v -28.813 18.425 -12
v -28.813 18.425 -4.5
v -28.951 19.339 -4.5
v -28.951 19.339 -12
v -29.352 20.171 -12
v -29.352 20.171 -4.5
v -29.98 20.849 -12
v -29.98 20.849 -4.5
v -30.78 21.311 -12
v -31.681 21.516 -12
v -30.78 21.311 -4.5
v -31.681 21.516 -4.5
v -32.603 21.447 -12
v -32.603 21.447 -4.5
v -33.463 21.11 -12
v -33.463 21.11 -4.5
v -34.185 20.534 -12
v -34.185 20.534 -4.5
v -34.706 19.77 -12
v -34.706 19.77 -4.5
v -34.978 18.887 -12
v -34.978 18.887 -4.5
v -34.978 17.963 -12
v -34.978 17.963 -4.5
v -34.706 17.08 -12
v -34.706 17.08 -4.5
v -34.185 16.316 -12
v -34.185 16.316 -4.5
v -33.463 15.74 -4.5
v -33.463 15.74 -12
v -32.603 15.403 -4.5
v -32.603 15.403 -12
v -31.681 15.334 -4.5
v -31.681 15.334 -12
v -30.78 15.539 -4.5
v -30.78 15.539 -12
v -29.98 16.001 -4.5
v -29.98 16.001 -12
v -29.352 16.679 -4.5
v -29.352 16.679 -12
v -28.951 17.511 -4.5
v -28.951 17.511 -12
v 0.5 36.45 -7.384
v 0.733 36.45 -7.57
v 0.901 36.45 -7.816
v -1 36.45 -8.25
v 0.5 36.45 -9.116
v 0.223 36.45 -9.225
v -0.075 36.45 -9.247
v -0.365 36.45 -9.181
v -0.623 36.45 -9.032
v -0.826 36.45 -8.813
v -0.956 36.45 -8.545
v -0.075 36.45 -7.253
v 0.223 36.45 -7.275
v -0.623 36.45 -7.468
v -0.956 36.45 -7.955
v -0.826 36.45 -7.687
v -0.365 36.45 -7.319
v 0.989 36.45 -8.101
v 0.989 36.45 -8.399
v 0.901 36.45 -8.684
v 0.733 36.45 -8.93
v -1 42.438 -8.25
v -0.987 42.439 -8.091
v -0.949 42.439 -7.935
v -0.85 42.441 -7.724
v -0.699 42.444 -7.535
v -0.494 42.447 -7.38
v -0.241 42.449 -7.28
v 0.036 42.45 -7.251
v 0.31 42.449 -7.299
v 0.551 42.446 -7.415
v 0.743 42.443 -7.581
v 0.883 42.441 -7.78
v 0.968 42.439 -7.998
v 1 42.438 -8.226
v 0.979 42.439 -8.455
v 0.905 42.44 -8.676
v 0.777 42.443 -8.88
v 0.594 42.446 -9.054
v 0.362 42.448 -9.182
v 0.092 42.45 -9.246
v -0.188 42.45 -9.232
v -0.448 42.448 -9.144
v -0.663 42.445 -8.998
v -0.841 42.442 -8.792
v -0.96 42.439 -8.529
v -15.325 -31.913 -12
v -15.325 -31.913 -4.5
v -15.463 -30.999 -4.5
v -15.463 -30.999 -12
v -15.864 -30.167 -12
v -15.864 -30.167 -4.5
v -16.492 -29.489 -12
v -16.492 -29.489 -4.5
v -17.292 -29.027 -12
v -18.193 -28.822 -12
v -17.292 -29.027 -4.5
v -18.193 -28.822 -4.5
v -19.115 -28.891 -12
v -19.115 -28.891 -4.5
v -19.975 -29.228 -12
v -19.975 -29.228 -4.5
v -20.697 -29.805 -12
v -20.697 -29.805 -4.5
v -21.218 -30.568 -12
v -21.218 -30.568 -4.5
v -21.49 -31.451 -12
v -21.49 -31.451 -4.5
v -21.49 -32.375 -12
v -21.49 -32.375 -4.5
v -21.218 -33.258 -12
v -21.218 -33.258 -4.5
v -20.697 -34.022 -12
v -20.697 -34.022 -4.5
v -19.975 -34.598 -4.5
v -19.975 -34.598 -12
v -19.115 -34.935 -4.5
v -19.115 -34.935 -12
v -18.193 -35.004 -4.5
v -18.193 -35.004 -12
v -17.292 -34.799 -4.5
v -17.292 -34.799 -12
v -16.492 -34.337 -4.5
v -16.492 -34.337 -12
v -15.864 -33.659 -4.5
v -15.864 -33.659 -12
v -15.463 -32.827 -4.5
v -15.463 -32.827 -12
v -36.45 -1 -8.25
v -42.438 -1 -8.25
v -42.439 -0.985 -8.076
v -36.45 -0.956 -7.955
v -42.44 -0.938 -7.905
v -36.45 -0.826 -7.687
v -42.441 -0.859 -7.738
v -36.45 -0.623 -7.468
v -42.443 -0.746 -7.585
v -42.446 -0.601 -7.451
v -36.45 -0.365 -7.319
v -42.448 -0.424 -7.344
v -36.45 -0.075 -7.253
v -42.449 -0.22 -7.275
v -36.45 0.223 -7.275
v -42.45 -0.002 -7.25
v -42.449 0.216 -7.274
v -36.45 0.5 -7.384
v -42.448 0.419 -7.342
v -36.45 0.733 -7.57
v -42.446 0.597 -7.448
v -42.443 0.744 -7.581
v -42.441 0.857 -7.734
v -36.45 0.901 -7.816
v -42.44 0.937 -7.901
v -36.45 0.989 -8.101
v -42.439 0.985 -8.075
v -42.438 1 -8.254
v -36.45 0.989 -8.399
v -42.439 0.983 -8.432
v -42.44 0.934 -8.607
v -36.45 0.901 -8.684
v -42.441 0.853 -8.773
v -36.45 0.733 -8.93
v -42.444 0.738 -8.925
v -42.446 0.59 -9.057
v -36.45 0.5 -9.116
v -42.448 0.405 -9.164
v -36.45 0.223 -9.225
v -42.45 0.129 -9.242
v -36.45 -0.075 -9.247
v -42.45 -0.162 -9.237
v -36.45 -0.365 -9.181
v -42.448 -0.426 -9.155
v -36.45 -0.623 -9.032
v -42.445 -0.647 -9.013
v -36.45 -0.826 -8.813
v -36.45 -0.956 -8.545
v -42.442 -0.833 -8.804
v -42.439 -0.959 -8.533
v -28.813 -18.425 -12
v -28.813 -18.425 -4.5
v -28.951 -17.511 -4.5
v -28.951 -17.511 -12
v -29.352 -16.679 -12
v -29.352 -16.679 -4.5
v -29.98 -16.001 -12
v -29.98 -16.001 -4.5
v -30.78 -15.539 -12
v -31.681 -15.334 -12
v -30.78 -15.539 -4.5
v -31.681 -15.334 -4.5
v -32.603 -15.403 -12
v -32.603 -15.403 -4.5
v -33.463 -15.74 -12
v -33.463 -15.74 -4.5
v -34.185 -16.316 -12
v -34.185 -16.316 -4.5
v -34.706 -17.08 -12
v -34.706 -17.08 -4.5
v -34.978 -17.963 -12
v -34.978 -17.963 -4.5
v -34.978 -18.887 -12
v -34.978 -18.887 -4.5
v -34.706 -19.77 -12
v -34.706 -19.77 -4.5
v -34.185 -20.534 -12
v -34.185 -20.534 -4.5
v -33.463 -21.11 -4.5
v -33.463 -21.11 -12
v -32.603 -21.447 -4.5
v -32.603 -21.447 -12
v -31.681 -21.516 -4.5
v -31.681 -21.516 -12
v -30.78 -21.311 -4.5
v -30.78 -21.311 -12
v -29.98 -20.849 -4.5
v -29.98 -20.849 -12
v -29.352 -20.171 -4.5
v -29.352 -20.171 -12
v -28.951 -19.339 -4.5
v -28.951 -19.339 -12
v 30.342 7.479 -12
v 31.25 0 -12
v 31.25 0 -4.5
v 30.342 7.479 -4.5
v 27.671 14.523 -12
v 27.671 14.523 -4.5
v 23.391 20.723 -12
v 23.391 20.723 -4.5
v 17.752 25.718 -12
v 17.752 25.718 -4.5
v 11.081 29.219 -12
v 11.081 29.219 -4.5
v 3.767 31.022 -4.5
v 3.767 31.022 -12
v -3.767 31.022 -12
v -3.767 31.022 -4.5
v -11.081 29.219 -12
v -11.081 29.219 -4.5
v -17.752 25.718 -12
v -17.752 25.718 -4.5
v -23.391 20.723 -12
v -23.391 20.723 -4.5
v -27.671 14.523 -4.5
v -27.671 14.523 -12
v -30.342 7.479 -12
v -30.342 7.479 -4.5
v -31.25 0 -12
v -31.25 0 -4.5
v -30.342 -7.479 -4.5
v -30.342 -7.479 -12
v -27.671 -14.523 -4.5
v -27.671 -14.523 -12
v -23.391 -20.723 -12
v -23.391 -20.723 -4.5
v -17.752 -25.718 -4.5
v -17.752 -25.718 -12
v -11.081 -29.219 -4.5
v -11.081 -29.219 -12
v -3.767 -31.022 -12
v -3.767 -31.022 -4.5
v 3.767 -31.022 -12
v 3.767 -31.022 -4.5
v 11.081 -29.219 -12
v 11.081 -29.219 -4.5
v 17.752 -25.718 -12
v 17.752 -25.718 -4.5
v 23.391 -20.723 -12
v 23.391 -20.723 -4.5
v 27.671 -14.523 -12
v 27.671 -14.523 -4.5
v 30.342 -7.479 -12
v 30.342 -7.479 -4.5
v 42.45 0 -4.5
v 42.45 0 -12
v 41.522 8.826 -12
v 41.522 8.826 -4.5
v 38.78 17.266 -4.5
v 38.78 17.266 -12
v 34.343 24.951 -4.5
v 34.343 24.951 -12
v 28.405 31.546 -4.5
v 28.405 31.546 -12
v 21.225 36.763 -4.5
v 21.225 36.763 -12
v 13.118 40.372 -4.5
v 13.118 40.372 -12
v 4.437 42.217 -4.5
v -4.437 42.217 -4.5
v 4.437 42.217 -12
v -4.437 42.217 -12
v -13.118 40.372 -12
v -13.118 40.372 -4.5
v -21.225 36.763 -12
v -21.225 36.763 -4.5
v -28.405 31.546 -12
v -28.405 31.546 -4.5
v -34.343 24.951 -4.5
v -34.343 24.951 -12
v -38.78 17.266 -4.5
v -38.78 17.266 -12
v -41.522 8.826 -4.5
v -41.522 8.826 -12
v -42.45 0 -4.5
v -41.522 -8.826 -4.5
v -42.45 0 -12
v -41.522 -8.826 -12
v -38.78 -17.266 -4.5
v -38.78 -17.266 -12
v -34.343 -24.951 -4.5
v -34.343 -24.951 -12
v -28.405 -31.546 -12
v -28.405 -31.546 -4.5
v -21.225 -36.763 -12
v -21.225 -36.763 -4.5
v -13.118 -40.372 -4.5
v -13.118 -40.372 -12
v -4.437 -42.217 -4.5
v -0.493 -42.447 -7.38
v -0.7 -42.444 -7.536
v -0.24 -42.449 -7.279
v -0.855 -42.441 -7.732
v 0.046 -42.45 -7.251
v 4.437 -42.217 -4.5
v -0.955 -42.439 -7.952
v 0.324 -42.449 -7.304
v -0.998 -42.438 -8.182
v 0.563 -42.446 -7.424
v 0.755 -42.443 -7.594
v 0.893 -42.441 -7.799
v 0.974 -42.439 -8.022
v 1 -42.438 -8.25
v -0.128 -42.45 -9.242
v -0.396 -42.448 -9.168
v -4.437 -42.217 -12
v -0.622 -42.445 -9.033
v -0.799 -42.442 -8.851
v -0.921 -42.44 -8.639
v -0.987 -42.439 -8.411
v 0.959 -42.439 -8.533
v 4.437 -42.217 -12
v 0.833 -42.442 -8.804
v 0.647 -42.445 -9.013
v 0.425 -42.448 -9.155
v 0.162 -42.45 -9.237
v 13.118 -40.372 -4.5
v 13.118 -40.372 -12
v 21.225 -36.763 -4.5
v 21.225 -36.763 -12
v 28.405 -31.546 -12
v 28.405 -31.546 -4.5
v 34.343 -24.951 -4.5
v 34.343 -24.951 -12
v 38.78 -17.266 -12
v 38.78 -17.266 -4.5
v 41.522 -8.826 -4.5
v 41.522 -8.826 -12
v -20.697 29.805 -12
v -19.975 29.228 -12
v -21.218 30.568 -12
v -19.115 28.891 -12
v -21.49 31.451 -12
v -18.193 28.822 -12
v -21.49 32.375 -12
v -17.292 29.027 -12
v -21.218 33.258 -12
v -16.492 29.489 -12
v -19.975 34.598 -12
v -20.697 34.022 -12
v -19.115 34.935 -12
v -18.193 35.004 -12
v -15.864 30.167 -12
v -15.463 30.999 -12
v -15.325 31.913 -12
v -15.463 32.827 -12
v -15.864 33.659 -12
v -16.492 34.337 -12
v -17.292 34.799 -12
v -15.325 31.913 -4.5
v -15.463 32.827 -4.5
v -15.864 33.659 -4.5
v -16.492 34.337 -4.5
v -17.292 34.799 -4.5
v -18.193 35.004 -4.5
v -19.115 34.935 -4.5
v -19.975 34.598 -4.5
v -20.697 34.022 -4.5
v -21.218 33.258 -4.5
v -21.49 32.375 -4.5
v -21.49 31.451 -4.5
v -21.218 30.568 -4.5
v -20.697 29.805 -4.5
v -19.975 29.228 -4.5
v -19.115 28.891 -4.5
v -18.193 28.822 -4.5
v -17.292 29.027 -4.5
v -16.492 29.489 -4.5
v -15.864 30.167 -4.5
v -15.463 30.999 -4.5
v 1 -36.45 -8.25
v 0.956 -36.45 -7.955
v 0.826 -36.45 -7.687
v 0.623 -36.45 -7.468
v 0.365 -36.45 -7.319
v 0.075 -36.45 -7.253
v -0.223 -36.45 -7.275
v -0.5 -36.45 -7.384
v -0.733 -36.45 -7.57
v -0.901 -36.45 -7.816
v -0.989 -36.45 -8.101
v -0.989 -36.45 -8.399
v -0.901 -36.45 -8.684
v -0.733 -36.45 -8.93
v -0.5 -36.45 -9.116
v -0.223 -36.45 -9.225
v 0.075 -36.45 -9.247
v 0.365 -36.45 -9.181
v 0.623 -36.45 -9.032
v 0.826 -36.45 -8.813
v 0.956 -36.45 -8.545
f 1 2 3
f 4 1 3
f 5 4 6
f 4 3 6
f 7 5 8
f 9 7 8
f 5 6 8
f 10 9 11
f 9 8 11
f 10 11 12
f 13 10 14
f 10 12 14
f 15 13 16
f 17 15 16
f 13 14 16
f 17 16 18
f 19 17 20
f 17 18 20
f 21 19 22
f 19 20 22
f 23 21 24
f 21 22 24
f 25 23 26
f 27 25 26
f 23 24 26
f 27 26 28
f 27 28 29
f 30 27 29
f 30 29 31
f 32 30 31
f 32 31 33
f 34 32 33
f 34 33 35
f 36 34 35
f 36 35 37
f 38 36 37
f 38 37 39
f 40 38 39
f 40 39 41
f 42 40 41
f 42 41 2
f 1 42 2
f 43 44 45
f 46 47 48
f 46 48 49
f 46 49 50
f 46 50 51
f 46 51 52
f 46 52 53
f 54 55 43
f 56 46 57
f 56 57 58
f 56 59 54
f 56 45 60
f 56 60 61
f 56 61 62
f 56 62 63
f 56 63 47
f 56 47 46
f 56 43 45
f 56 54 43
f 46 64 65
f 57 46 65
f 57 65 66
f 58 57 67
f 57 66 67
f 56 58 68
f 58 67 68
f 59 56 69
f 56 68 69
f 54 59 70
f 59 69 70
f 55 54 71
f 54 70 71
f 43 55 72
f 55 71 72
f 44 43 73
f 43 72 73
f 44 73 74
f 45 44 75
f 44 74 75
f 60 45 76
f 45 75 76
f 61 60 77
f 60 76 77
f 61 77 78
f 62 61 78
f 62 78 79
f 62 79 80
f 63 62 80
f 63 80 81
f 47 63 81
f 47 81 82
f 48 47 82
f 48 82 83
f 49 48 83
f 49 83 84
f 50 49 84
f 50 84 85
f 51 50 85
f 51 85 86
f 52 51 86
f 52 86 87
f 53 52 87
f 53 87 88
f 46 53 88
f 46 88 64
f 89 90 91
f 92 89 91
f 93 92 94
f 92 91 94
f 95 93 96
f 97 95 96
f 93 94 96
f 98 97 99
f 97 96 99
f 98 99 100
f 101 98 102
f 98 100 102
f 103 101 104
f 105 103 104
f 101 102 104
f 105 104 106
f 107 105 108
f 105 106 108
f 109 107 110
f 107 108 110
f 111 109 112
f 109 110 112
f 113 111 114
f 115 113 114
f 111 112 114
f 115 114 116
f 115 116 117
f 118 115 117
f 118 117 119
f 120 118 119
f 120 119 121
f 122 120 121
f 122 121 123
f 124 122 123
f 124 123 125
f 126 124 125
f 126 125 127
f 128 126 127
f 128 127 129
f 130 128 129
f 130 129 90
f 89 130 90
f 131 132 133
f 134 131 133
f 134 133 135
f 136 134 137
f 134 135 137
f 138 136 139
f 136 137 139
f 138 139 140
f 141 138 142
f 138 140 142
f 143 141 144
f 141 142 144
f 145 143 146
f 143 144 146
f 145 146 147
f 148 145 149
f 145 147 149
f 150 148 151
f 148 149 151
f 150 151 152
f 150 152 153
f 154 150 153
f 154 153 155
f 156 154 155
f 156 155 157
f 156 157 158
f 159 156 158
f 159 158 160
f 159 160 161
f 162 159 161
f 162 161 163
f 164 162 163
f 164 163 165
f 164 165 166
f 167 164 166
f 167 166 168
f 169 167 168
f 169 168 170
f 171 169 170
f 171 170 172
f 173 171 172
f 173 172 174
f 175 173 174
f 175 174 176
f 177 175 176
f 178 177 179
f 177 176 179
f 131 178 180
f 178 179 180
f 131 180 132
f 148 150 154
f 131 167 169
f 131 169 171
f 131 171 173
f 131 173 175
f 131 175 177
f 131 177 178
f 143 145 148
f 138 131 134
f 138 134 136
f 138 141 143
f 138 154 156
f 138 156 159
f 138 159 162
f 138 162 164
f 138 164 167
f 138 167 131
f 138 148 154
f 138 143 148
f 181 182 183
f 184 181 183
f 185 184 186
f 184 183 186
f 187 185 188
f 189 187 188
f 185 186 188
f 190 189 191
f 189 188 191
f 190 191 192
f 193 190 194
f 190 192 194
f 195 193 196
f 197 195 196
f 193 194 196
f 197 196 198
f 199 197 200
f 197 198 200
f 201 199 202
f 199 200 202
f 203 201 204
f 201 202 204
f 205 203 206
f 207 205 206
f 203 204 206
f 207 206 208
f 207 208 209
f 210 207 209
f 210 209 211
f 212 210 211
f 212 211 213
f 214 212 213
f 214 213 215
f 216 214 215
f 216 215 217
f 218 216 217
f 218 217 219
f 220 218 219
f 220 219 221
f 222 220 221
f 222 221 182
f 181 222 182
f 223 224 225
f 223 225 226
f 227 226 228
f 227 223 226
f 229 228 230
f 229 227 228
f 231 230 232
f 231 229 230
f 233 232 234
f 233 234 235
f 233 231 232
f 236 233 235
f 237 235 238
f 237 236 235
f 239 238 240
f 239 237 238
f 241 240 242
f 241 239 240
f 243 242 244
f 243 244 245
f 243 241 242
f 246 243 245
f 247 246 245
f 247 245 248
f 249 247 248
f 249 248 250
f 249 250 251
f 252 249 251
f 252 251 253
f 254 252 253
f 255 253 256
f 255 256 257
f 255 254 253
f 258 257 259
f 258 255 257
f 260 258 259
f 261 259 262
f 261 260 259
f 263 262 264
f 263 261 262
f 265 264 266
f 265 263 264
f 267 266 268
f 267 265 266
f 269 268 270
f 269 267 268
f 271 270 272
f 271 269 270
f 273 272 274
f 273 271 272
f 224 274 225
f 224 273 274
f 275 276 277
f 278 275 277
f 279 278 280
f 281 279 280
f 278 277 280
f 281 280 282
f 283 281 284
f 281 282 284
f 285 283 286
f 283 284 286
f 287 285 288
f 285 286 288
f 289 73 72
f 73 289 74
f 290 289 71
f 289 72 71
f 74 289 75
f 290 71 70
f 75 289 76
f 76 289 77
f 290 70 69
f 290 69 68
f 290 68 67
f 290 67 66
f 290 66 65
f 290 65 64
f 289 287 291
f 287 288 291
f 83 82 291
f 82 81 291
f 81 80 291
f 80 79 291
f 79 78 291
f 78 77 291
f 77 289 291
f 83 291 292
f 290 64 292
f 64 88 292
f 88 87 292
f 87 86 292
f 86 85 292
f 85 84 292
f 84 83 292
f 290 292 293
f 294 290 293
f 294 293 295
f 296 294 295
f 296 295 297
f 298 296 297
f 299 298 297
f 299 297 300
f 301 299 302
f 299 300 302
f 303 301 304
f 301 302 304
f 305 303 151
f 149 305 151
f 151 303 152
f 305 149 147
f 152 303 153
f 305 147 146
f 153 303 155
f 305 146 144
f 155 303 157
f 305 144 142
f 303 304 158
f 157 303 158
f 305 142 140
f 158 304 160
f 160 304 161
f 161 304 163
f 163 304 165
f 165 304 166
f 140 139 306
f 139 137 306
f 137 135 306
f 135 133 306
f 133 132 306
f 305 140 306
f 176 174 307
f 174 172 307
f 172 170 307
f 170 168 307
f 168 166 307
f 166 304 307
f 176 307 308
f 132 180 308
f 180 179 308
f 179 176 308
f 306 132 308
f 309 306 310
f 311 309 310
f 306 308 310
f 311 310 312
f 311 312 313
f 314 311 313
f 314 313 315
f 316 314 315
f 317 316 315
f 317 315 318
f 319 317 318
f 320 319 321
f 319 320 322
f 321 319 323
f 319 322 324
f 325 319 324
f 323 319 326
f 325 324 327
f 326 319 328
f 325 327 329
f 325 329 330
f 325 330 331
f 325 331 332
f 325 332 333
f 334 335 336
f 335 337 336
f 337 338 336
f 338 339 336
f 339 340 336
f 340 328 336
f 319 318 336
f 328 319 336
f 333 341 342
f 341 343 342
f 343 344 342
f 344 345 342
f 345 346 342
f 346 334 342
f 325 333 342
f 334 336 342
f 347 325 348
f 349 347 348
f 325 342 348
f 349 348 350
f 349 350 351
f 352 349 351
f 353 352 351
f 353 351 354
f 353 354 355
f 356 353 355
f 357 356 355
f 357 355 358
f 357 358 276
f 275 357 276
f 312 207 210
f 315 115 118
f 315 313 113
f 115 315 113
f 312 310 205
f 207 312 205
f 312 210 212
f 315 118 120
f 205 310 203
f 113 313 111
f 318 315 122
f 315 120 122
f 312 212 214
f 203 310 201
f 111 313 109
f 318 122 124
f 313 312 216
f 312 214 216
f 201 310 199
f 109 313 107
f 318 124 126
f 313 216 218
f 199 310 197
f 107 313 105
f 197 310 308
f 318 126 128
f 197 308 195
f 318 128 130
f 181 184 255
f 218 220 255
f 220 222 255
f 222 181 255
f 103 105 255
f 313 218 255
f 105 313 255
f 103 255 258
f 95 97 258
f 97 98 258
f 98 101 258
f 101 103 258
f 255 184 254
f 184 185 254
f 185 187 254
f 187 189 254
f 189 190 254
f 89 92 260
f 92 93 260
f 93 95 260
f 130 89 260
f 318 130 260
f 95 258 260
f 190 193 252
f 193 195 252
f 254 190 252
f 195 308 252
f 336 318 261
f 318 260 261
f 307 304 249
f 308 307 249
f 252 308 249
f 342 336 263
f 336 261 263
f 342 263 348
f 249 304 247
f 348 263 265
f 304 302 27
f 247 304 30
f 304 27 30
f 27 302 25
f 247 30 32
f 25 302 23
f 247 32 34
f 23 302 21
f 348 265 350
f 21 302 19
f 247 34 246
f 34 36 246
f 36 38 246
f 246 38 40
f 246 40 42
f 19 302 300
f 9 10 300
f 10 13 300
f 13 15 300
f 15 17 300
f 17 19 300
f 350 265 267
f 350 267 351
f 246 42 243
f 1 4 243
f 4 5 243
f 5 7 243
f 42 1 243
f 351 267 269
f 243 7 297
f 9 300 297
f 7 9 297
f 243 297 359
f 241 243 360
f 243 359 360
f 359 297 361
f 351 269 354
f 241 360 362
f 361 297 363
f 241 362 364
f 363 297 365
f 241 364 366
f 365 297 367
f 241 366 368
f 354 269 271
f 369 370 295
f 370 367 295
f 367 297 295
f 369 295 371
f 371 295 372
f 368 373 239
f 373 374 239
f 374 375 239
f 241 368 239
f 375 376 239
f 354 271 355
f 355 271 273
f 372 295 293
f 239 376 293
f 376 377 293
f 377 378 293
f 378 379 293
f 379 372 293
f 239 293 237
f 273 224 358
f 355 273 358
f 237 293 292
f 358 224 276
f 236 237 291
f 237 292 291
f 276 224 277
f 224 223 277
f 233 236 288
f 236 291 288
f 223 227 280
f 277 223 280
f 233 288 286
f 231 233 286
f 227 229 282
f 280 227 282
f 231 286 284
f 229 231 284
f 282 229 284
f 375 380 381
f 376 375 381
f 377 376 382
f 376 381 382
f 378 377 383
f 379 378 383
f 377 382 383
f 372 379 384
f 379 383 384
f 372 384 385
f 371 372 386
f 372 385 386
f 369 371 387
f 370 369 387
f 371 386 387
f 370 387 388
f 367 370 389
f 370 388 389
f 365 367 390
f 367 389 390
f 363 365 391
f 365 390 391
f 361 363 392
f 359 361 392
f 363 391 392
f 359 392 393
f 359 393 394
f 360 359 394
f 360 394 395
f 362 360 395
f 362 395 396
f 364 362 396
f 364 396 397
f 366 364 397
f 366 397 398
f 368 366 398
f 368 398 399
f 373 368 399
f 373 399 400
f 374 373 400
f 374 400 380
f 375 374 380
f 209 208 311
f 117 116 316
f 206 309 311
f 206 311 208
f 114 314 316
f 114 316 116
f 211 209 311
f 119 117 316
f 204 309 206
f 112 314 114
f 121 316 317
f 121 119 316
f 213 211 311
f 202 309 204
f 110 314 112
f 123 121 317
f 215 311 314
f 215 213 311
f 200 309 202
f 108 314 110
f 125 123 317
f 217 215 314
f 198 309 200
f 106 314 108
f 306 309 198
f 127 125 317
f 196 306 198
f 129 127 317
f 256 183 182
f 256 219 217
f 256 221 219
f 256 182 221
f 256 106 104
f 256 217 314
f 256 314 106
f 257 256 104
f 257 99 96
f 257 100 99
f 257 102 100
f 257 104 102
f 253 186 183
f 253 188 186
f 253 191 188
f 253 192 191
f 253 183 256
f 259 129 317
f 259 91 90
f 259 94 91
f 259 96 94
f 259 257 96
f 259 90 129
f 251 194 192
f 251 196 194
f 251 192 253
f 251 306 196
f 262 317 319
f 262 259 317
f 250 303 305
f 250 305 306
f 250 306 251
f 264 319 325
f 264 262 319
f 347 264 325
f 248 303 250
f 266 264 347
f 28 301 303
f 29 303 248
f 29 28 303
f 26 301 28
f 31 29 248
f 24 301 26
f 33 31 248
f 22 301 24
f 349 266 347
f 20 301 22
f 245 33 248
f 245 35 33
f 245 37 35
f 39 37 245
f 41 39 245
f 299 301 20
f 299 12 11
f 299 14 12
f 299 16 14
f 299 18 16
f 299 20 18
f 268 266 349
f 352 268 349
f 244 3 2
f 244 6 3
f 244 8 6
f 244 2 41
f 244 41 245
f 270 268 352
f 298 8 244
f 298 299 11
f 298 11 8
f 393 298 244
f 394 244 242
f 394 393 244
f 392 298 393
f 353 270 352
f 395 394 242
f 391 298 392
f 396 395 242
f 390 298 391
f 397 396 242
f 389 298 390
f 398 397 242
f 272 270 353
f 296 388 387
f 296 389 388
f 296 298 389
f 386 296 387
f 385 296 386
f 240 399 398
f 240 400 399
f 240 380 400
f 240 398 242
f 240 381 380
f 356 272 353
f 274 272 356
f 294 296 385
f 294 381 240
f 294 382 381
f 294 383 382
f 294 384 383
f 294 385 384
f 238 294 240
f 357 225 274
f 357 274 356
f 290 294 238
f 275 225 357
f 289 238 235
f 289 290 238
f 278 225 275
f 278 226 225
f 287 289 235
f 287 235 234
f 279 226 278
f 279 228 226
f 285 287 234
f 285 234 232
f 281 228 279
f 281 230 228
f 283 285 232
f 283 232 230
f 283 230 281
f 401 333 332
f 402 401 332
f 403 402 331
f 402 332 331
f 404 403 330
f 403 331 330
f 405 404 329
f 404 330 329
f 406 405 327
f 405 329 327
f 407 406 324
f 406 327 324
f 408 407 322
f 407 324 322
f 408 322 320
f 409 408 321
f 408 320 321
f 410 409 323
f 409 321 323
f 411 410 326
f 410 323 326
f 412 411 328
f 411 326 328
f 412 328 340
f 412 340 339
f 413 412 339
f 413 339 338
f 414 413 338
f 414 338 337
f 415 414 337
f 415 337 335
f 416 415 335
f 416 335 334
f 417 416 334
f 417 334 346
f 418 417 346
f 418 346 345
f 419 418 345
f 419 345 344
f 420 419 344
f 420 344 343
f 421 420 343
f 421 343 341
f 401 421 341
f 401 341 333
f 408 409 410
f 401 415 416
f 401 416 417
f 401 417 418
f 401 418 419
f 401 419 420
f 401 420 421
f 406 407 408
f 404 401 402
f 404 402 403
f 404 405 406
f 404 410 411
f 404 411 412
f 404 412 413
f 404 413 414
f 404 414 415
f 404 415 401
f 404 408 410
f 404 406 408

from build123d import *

# Parameters (mm, degrees)
SKETCH_R              = 42.45
SKETCH_R_2            = 31.25
PAD_DEPTH             = 7.5
SKETCH011_R           = 3.1
POCKET003_DEPTH       = 7.501
SKETCH024_R           = 1
POCKET012_DEPTH       = 6
POLARPATTERN001_COUNT = 3
POLARPATTERN001_ANGLE = 180


with BuildPart() as part:
    # Sketch → Pad (new body)
    with BuildSketch(Plane.XY):
        Circle(SKETCH_R)
        Circle(SKETCH_R_2, mode=Mode.SUBTRACT)
    extrude(amount=PAD_DEPTH)

    # Sketch011 (on DatumPlane) → Pocket003 (cut, through all)
    with BuildSketch(Plane.XY.offset(7.5)):
        with Locations((-31.913036, 18.425)):
            Circle(SKETCH011_R)
        with Locations((-31.913036, -18.425)):
            Circle(SKETCH011_R)
        with Locations((-18.425, 31.913036)):
            Circle(SKETCH011_R)
        with Locations((-18.425, -31.913036)):
            Circle(SKETCH011_R)
    extrude(amount=-POCKET003_DEPTH, mode=Mode.SUBTRACT)

    # Sketch024 (on DatumPlane) → Pocket012 (cut)
    with BuildSketch(Plane.XZ.offset(42.45)):
        with Locations((0, 3.75)):
            Circle(SKETCH024_R)
    pocket012 = extrude(amount=-POCKET012_DEPTH, mode=Mode.SUBTRACT)

    # PolarPattern001: Pocket012 ×3 about axis
    polarpattern001_axis = Axis((0, 0, 0), (0, 0, -1))
    for i in range(1, POLARPATTERN001_COUNT):
        add(pocket012.rotate(polarpattern001_axis, i * POLARPATTERN001_ANGLE / (POLARPATTERN001_COUNT - 1)), mode=Mode.SUBTRACT)


with BuildPart() as part_1:
    # Body placement: moved
    add(part.part.moved(Location((0, 0, -12))))


solid = part_1.part
